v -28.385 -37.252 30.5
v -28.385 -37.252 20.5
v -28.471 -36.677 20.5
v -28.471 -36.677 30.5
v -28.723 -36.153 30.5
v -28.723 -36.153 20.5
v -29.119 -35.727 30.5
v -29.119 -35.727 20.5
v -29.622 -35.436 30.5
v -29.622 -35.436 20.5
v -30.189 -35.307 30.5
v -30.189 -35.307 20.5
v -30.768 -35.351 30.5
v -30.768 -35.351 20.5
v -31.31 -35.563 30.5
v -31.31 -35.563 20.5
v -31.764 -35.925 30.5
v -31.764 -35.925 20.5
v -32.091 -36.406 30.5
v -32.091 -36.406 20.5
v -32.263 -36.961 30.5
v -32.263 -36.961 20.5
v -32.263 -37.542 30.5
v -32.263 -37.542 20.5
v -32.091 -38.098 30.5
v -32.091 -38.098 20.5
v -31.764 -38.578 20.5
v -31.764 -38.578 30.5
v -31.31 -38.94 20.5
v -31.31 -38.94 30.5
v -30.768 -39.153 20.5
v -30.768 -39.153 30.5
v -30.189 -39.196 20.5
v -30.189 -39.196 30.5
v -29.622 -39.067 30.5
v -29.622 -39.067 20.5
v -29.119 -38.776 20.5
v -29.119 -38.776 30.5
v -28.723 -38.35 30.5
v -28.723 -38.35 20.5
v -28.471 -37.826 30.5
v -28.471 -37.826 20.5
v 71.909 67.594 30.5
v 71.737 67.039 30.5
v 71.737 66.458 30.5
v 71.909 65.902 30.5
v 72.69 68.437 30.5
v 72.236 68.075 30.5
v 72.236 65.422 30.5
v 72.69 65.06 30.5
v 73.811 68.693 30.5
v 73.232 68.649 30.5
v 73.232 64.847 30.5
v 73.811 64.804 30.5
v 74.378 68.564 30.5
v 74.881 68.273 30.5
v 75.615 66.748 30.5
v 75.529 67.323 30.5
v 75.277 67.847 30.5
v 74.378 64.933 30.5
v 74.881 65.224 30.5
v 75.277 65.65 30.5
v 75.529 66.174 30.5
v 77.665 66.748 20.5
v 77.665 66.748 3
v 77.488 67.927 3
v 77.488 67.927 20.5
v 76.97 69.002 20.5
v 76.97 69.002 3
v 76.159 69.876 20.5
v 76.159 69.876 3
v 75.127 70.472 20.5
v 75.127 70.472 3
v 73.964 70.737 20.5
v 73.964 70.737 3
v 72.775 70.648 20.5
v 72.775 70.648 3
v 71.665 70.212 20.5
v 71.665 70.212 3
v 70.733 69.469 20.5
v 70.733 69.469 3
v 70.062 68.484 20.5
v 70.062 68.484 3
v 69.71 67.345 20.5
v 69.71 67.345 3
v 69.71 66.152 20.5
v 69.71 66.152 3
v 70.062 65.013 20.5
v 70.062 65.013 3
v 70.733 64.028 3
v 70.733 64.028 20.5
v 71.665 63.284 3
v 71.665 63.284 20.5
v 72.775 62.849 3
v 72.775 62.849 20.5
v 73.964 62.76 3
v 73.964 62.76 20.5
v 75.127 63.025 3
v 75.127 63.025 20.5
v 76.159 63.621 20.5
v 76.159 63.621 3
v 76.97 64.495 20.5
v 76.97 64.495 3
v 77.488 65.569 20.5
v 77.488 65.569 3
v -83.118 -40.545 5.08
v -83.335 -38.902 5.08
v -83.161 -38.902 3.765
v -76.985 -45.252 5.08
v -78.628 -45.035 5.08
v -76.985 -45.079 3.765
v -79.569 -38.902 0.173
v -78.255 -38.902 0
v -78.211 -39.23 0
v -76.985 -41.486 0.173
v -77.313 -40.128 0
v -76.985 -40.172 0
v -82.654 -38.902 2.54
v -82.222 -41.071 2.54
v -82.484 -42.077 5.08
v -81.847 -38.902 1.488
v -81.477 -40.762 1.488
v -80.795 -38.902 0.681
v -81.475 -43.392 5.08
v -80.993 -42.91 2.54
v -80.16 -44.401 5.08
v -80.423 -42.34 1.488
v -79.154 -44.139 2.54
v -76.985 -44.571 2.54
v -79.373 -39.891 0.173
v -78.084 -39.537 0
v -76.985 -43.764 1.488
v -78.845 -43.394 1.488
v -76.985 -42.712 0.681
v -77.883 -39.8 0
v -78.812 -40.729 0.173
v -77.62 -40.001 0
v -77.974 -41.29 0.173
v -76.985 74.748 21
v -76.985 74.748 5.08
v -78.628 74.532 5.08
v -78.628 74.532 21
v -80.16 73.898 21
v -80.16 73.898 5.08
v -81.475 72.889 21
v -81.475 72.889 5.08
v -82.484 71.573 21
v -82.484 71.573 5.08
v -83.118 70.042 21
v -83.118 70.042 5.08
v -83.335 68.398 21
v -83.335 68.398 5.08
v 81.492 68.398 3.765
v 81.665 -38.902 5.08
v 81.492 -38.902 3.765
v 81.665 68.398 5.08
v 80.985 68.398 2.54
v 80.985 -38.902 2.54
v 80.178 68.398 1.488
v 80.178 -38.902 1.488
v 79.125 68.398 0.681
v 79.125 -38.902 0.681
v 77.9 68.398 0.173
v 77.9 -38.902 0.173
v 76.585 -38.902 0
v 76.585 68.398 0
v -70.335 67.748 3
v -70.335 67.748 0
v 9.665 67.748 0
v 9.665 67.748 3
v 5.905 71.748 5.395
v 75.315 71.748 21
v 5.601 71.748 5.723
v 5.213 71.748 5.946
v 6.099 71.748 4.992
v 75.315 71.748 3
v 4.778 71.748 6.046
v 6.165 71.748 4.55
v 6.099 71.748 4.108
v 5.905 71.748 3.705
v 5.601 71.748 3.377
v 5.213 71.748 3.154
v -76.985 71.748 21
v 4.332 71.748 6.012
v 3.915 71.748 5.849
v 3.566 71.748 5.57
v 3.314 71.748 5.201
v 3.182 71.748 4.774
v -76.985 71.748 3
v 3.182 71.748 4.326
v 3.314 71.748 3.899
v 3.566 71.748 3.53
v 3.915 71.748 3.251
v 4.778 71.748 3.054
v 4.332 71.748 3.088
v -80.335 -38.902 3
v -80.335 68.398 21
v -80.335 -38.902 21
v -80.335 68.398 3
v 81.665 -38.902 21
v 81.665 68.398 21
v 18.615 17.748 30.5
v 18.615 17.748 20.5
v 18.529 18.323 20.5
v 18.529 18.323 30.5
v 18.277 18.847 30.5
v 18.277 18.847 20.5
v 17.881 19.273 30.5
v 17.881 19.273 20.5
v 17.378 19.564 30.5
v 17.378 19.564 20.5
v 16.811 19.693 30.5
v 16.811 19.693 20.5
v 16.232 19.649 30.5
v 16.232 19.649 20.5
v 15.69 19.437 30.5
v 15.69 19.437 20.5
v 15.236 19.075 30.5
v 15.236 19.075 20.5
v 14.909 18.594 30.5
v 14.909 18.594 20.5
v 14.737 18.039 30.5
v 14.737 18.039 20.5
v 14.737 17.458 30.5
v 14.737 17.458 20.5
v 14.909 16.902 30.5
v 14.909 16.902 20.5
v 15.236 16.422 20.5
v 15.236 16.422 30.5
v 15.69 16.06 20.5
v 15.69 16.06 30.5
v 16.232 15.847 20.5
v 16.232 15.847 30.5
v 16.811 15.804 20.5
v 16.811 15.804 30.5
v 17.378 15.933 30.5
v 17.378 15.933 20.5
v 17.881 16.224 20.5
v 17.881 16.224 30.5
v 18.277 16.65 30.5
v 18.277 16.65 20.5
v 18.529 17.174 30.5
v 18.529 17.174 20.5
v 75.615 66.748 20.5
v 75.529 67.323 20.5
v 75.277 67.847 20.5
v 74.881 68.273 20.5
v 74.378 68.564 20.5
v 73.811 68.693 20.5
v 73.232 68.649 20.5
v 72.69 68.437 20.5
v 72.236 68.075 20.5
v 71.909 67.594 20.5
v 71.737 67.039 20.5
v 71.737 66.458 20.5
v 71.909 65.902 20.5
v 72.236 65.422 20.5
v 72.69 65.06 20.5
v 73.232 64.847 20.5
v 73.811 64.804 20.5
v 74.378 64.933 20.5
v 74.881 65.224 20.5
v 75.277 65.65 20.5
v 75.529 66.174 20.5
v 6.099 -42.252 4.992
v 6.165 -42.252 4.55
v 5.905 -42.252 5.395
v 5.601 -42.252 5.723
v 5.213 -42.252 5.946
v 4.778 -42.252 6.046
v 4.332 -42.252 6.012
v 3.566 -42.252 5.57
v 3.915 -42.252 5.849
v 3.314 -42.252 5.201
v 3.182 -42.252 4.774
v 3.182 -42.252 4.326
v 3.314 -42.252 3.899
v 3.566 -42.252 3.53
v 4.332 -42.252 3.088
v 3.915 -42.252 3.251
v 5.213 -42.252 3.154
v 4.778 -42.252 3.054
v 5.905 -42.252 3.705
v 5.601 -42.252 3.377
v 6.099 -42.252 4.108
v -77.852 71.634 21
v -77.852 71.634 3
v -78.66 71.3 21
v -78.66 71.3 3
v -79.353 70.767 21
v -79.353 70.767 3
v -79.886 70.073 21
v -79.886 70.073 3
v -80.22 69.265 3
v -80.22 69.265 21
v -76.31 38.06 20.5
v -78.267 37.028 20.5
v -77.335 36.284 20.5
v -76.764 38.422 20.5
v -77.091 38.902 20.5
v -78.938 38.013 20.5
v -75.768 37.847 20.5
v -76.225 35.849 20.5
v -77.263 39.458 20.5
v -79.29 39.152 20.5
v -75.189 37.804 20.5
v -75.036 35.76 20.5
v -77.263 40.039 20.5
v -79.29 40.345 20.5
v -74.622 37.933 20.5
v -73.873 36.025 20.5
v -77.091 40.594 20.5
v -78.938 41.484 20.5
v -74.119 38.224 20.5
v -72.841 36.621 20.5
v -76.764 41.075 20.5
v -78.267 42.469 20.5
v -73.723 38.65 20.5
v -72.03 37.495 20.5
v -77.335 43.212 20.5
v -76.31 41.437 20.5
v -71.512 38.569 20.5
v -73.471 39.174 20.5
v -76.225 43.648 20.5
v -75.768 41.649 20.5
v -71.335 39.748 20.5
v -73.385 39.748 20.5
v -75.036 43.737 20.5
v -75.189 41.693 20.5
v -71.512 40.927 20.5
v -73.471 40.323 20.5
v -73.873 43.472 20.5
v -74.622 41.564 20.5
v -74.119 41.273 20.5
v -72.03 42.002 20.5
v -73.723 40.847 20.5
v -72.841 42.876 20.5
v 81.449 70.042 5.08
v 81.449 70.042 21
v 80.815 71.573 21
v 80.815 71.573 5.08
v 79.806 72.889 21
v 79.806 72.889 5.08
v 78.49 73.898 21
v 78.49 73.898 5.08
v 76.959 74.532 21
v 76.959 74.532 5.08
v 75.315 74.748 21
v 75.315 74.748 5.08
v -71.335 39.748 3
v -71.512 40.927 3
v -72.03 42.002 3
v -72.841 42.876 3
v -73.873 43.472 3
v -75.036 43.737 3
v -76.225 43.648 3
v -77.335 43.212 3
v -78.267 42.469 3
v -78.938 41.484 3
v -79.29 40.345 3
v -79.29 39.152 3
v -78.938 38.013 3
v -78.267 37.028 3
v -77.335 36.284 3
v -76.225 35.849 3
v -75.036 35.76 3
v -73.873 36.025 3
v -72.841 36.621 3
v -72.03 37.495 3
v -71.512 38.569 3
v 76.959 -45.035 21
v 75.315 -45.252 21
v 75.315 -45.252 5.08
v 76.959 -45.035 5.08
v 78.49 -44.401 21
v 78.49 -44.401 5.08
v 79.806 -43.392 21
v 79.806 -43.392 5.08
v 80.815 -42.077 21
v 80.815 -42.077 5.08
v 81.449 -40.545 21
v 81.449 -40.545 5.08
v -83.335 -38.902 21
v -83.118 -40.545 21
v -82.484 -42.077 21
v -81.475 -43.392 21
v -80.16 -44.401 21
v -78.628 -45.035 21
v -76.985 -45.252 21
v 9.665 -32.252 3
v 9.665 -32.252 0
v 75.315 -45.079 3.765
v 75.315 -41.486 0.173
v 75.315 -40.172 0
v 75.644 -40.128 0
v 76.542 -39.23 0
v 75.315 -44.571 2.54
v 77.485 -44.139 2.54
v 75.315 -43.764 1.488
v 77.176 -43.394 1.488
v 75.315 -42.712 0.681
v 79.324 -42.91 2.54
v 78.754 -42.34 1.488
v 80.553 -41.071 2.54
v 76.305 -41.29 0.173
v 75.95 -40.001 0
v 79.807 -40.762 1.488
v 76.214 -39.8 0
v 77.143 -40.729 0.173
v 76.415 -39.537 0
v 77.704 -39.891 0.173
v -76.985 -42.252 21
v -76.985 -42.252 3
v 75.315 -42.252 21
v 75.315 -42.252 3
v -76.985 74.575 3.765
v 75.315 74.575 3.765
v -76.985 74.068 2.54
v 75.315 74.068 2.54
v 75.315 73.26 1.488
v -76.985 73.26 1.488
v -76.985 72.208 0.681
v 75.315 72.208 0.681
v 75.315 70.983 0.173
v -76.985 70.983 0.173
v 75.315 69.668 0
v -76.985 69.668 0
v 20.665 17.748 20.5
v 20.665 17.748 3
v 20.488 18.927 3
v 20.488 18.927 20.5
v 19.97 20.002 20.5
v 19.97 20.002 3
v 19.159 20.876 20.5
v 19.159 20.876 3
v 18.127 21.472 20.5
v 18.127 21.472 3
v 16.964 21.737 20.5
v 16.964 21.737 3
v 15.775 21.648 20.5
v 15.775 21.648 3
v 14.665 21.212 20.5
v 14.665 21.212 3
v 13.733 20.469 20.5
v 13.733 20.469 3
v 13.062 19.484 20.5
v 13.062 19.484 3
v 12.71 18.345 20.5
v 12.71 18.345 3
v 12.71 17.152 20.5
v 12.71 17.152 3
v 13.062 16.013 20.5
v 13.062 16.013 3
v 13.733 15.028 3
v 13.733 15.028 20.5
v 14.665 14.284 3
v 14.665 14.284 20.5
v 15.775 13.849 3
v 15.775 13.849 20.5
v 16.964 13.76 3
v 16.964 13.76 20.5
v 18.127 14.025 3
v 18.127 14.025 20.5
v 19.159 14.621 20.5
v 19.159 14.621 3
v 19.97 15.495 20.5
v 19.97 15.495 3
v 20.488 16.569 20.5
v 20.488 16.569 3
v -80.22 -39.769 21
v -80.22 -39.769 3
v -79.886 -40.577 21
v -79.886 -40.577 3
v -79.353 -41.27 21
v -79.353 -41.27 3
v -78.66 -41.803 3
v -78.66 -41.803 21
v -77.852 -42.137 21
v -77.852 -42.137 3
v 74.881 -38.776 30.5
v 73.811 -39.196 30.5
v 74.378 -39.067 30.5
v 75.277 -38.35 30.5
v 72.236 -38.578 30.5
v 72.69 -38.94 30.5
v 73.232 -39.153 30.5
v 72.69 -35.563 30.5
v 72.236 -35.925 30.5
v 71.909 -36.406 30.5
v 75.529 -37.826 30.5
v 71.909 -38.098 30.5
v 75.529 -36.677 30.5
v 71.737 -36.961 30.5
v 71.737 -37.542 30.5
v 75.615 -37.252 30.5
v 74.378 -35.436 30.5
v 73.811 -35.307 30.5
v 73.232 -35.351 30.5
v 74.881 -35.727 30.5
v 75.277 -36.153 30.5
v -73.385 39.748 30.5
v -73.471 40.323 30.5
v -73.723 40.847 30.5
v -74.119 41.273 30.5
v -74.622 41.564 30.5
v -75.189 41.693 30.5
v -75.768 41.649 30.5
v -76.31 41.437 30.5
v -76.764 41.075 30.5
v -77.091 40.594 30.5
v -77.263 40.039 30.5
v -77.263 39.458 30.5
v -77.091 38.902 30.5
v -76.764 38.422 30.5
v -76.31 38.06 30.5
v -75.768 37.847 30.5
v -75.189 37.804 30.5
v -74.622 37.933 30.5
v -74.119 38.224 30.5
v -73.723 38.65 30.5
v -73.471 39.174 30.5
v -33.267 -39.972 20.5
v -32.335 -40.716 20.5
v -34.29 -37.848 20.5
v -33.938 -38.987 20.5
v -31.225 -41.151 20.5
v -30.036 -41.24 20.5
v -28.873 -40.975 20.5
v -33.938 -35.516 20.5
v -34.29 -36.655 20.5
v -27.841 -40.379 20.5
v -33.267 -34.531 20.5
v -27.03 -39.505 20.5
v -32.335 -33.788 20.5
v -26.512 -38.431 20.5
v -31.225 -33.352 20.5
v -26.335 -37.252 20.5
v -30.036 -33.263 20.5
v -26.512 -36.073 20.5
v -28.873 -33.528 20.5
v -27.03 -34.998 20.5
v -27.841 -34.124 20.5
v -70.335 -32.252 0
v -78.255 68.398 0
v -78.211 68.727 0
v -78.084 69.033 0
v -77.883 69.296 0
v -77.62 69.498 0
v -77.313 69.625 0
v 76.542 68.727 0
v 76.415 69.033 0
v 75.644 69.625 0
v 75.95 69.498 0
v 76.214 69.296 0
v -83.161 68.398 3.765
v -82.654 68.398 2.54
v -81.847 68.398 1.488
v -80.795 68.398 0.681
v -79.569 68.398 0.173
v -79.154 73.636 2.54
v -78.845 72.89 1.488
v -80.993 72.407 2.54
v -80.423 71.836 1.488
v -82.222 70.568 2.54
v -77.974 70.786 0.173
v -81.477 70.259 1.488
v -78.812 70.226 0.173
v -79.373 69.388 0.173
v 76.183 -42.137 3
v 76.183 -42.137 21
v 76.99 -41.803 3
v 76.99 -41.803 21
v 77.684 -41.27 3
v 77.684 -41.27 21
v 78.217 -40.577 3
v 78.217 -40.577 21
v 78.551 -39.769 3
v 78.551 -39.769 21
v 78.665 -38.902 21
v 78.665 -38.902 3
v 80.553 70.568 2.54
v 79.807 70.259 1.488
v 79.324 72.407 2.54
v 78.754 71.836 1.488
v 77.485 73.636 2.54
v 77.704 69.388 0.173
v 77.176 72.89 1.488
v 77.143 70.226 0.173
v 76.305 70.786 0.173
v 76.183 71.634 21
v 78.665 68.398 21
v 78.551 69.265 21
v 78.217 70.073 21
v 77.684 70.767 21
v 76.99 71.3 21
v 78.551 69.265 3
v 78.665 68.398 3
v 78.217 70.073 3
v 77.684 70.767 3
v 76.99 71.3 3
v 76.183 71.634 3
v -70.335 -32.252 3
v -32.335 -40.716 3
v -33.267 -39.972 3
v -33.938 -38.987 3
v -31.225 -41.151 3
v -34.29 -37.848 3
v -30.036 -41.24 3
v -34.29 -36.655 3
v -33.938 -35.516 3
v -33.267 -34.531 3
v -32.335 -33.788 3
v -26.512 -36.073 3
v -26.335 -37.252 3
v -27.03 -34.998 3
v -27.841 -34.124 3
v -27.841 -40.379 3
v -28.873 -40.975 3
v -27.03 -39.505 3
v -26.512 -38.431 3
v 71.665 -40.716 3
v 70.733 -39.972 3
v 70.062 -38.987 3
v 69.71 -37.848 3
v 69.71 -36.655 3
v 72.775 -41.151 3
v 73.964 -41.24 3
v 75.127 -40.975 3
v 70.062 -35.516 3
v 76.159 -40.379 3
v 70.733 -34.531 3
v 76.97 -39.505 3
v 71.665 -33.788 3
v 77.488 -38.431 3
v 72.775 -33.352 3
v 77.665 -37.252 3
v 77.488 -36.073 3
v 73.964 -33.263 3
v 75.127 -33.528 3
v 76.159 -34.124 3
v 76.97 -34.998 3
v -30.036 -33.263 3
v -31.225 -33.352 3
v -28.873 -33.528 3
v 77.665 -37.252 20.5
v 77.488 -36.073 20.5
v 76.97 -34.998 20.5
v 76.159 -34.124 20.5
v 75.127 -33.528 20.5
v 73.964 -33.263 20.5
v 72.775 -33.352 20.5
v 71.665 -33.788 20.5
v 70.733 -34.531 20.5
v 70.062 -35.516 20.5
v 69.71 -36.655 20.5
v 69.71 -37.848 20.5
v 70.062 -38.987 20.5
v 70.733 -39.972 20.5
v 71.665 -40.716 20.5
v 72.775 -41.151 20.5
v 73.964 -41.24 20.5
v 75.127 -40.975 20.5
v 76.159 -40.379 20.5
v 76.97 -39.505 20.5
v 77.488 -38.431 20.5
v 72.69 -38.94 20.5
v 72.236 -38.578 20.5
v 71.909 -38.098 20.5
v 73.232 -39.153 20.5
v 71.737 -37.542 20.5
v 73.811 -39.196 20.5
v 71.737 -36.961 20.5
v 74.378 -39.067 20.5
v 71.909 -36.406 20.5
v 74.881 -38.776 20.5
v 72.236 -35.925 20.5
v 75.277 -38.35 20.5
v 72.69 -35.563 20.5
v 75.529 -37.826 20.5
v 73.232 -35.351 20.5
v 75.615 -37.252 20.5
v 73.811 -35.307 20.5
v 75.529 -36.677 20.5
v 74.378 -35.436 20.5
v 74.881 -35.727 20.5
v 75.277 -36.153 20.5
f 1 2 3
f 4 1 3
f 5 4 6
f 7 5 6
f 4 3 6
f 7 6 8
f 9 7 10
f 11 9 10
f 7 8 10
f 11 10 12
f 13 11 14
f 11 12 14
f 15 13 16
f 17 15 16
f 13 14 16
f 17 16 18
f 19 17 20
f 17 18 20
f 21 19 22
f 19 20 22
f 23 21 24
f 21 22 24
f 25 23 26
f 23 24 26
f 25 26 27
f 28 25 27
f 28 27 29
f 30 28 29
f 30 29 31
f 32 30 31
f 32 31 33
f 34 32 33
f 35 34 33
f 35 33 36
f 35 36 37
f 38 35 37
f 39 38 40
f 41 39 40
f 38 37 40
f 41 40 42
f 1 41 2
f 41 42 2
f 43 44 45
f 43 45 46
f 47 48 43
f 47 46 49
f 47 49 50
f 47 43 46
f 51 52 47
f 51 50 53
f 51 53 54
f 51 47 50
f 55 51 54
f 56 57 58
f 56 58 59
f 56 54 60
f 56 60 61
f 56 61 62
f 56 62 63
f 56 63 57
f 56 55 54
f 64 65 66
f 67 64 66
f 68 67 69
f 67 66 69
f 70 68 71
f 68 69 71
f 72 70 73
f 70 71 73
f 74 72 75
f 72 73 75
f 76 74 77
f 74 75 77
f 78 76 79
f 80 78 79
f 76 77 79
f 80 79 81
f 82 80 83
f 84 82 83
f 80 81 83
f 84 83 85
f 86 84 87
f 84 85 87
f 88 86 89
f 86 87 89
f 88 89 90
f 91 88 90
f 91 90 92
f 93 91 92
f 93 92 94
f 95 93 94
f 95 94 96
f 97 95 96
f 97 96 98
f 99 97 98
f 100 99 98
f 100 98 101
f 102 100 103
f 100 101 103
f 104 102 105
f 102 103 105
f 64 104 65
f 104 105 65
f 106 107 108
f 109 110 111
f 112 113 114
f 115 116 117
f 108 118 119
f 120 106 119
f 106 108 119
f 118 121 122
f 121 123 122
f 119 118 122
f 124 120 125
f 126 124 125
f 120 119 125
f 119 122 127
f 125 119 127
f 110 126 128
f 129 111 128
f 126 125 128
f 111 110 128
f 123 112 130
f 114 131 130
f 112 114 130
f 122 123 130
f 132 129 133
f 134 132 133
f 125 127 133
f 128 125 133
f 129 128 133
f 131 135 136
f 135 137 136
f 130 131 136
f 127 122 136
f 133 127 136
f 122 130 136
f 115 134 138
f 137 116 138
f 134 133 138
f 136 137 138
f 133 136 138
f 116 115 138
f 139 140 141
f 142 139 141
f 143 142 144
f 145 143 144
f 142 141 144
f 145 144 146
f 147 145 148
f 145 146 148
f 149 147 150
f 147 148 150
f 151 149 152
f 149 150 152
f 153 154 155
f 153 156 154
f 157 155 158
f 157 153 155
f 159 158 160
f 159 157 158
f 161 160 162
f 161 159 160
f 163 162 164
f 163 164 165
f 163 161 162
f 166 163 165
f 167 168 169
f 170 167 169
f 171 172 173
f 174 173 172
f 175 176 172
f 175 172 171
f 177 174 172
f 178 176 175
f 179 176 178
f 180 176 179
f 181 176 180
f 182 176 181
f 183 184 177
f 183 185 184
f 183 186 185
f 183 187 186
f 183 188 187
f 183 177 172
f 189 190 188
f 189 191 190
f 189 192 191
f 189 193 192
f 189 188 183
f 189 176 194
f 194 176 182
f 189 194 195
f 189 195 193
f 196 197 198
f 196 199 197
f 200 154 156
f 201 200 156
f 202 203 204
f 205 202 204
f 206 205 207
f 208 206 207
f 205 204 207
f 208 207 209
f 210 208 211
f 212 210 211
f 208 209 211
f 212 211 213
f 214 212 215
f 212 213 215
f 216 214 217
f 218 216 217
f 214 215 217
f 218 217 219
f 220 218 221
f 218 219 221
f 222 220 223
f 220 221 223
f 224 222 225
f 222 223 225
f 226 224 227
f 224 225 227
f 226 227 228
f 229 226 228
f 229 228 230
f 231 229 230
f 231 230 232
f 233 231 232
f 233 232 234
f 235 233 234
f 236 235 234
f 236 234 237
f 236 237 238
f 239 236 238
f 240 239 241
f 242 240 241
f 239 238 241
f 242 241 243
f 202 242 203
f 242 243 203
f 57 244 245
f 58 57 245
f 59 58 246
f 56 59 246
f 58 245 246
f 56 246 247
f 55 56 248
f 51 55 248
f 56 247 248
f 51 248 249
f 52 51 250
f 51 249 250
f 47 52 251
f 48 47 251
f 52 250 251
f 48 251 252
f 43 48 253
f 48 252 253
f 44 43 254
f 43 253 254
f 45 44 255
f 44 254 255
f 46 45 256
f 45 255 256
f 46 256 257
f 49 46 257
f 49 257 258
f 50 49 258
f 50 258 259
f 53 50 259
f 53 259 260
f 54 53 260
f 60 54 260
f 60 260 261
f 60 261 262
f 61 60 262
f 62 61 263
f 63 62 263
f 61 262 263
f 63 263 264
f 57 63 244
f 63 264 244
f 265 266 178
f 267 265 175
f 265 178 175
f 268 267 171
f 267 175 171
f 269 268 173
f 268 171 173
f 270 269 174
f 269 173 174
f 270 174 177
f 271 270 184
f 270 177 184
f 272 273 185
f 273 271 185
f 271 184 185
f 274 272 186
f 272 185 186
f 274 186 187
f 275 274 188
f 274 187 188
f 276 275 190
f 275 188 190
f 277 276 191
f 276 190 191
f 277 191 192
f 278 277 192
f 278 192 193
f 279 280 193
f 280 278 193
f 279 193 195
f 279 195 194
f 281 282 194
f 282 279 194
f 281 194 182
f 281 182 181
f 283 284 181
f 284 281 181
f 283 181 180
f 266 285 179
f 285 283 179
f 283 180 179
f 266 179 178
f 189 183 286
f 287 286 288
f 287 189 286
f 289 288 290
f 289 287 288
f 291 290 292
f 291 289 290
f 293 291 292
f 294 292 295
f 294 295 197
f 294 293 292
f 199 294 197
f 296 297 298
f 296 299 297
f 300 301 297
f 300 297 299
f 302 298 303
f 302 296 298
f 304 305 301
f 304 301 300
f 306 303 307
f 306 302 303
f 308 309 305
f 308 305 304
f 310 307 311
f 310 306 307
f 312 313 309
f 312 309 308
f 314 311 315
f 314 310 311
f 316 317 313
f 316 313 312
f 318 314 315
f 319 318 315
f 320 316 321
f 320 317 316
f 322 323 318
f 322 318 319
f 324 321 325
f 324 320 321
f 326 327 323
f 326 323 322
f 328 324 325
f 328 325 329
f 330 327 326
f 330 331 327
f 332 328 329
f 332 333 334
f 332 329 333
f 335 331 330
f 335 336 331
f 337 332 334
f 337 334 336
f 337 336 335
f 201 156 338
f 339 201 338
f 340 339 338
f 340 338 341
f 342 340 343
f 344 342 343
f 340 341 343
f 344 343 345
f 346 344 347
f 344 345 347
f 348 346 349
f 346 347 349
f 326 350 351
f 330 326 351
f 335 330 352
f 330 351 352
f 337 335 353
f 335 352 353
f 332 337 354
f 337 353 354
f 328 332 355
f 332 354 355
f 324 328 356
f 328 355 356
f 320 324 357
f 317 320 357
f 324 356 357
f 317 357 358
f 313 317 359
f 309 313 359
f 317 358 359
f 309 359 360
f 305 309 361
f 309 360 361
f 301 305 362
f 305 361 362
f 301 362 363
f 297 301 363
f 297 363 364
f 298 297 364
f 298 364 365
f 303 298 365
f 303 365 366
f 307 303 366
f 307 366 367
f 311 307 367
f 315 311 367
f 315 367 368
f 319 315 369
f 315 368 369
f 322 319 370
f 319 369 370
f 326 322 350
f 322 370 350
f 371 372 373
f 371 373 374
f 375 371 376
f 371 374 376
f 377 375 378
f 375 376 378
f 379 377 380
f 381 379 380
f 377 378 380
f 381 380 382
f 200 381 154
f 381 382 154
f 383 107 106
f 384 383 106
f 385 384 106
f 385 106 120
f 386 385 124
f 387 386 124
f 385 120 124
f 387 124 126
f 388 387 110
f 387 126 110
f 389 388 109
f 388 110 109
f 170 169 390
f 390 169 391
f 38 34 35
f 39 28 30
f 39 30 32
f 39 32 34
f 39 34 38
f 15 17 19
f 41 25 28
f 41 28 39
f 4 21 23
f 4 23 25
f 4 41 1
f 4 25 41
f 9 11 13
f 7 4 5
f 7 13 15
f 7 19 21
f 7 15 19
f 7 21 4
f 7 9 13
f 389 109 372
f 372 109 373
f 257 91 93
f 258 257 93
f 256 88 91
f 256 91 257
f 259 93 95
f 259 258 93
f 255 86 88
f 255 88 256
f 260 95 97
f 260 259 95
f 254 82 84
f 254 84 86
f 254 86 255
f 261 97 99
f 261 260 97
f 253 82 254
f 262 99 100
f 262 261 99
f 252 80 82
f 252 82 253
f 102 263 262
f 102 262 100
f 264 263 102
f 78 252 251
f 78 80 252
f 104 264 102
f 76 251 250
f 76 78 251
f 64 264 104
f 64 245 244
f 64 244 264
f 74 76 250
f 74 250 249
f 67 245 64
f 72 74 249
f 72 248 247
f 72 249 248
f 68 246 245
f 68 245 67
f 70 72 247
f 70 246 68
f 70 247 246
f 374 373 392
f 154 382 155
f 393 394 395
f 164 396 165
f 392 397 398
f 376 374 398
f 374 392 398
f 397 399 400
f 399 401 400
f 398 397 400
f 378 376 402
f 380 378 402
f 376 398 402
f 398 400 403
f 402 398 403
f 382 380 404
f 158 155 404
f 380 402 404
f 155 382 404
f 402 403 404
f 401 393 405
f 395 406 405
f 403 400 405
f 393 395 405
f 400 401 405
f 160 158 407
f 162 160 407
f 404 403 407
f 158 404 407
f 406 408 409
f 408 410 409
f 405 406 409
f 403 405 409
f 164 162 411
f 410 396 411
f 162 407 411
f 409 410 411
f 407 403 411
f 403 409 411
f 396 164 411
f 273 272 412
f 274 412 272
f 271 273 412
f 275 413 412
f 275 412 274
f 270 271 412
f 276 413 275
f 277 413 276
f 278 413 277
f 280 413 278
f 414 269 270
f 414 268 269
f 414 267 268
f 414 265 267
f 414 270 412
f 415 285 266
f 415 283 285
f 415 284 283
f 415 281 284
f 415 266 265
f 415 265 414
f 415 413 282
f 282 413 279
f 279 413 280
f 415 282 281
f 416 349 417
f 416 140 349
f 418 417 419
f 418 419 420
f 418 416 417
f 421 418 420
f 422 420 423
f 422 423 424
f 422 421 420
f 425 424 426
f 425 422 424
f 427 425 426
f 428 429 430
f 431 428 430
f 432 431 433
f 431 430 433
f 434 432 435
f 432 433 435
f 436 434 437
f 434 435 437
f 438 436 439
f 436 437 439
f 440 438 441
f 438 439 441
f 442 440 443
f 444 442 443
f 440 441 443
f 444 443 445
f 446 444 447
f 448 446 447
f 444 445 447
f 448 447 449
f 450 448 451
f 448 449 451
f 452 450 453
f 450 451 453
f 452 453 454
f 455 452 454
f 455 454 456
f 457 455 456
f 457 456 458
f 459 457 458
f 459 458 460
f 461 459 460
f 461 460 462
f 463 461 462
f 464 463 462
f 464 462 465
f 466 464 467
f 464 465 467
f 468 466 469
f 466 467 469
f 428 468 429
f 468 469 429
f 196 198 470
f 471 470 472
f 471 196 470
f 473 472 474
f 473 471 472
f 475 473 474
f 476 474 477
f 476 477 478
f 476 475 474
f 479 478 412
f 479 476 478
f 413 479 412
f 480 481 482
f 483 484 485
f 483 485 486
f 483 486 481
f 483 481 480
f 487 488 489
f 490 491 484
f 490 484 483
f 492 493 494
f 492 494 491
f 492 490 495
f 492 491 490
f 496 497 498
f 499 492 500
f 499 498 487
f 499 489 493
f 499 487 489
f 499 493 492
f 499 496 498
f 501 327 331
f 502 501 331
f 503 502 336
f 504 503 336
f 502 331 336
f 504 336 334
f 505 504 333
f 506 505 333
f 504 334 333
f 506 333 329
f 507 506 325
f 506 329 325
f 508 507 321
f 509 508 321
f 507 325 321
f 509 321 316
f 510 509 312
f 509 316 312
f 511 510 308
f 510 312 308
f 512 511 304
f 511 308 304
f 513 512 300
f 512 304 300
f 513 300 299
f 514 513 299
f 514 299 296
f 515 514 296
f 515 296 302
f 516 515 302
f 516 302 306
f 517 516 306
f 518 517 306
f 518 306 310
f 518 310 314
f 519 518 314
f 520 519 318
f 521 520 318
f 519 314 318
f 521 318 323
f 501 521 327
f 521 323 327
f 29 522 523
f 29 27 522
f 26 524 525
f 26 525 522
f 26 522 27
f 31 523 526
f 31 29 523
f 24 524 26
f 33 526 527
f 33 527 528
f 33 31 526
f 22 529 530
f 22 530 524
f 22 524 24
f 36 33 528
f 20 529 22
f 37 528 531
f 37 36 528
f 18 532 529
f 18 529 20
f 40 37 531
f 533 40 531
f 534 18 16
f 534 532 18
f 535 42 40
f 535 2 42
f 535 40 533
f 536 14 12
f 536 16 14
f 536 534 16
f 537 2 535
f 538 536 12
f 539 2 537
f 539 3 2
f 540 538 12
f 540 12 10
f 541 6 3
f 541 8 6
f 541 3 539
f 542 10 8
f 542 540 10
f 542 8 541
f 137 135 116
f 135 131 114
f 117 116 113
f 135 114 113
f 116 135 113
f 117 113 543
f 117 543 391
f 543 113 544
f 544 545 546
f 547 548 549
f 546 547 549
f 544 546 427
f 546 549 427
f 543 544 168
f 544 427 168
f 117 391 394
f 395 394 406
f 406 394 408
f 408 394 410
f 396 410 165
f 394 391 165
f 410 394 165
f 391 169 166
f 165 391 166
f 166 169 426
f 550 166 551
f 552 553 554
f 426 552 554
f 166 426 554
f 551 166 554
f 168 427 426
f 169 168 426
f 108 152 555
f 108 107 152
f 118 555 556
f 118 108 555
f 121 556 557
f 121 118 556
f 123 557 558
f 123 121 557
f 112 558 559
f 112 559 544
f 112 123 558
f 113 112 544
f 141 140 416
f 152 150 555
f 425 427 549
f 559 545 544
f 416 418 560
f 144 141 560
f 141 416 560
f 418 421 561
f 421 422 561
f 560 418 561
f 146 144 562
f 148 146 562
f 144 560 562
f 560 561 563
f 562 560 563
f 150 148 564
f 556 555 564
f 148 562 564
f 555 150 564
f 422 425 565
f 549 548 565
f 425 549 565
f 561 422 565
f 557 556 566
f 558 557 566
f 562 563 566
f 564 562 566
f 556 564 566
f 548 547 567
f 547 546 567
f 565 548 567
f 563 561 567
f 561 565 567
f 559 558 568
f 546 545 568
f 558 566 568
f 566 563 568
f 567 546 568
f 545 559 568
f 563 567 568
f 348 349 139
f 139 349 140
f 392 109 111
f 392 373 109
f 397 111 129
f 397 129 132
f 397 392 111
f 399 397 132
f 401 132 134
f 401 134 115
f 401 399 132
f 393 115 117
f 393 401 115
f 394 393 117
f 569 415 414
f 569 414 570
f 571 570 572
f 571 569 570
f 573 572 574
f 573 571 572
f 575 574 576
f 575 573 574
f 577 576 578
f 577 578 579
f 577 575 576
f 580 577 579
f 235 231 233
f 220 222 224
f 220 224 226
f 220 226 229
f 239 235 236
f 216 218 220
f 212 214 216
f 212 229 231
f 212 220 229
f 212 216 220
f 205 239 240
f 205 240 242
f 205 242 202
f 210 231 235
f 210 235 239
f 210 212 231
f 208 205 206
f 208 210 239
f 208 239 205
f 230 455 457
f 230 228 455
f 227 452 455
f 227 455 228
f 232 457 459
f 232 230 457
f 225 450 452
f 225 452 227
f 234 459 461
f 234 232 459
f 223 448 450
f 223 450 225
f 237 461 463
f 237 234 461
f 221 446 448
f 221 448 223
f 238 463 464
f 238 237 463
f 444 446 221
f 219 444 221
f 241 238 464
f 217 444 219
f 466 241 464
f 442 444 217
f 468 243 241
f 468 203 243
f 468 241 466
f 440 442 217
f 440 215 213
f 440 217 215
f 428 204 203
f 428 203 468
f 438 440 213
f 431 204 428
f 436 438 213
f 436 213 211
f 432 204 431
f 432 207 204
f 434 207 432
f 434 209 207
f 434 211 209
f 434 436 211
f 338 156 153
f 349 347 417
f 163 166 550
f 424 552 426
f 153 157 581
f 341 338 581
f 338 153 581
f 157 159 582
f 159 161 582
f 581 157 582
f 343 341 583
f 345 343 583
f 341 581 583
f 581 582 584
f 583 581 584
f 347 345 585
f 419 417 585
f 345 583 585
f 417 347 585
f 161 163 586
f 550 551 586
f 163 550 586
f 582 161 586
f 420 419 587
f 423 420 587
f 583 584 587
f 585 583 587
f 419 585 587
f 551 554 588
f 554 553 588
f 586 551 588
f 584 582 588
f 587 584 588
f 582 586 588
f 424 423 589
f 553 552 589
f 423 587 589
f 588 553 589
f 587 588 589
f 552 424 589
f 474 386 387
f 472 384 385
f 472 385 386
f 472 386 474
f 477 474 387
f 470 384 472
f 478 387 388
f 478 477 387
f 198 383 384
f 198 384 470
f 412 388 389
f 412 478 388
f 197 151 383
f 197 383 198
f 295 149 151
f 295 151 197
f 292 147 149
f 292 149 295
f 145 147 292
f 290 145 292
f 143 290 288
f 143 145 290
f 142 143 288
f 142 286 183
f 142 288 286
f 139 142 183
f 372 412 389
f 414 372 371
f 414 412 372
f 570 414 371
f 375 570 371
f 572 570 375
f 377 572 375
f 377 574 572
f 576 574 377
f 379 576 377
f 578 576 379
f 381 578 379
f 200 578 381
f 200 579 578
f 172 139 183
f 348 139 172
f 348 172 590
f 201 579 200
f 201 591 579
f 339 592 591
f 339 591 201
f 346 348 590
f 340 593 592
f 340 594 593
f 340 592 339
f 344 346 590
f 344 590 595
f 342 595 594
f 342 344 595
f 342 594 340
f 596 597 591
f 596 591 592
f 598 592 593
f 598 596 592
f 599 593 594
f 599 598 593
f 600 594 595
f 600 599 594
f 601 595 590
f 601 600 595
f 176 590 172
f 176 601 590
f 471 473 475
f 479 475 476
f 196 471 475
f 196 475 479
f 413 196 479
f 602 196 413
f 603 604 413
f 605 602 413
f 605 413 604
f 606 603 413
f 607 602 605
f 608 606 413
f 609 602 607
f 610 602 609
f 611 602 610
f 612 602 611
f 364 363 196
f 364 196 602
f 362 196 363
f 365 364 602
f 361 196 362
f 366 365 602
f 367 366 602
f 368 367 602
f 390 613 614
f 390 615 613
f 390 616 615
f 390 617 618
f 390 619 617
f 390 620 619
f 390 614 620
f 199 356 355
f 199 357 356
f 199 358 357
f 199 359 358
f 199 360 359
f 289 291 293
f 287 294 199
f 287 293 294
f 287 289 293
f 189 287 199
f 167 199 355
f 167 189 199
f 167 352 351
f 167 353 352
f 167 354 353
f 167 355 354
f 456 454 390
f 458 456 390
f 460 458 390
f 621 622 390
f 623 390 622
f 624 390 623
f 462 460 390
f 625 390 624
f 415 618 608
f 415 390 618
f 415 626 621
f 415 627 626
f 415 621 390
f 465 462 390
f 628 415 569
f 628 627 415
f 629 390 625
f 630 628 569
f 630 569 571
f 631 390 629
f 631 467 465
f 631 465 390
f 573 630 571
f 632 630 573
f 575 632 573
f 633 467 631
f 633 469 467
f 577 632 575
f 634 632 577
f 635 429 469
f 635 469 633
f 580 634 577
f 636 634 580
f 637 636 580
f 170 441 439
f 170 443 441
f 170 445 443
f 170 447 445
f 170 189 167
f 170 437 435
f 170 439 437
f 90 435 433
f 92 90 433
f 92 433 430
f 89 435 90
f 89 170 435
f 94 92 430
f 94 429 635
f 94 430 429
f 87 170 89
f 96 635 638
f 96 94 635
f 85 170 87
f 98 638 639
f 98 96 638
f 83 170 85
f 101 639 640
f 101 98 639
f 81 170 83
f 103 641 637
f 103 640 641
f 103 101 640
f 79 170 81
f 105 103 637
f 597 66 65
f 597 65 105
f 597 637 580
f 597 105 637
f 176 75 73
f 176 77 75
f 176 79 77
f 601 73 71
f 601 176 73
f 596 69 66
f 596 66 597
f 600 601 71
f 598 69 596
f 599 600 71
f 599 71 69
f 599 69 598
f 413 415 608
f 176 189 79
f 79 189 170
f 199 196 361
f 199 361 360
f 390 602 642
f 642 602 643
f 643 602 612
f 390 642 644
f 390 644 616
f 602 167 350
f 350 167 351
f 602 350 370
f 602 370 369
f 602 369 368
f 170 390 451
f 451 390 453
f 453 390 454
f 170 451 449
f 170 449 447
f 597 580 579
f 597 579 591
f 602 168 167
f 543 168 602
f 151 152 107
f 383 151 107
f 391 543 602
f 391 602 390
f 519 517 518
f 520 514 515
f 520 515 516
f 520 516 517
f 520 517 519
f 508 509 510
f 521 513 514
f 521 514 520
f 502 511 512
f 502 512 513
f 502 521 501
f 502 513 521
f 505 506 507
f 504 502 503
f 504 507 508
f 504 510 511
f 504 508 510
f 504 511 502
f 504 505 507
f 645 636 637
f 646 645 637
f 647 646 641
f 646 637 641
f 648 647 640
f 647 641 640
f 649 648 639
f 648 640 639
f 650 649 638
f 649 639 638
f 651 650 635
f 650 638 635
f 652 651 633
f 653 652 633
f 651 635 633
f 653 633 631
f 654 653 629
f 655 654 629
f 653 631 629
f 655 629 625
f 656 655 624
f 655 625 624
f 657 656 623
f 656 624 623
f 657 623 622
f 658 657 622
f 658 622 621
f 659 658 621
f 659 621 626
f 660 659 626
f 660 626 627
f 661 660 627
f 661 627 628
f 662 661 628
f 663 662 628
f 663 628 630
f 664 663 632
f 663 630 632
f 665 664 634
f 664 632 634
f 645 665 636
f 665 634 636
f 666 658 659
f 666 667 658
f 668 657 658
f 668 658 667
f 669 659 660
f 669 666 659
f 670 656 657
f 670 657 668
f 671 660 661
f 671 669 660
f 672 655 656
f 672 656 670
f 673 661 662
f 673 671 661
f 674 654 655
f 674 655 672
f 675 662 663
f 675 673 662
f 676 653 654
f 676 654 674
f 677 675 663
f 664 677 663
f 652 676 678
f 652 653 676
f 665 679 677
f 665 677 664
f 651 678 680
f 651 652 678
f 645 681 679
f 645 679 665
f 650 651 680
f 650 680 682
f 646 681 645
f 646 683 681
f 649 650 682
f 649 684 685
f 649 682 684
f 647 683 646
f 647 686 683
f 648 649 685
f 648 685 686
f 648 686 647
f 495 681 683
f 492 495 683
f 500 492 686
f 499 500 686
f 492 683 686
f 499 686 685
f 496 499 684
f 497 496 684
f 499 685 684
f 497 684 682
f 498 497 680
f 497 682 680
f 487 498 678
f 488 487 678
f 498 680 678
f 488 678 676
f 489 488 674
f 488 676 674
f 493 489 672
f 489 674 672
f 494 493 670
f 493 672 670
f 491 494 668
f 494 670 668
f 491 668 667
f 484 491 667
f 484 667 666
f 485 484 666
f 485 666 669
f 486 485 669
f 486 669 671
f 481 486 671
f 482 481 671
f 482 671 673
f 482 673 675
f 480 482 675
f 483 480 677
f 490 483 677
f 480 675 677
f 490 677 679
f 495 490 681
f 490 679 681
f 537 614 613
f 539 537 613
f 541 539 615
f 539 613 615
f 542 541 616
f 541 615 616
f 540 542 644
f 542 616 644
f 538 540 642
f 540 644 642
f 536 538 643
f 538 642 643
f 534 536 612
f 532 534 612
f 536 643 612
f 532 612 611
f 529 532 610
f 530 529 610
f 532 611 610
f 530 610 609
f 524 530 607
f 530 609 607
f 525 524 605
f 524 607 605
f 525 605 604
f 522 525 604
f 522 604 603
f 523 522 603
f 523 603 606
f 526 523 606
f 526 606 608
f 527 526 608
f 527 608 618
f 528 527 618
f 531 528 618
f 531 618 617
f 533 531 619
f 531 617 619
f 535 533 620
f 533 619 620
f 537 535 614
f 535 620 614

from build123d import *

# Parameters (mm, degrees)
F1_DEPTH  = 21
F2_T      = -3
F3_R      = 5.08
F4_R      = 4
F5_DEPTH  = 17.5
F6_R      = 1.95
F7_DEPTH  = 10
F8_W      = 80
F8_H      = 100
F9_DEPTH  = 25
F10_R     = 1.5
F11_DEPTH = 115


with BuildPart() as f1:
    # F0 (on Top) → F1 (new body)
    with BuildSketch(Plane.XY):
        with BuildLine():
            ThreePointArc((-83.334517, -38.901611), (-81.474645, -43.391739), (-76.984517, -45.251611))
            Line((-76.984517, -45.251611), (75.315483, -45.251611))
            ThreePointArc((75.315483, -45.251611), (79.805611, -43.391739), (81.665483, -38.901611))
            Line((81.665483, -38.901611), (81.665483, 68.398389))
            ThreePointArc((81.665483, 68.398389), (79.805611, 72.888517), (75.315483, 74.748389))
            Line((75.315483, 74.748389), (-76.984517, 74.748389))
            ThreePointArc((-76.984517, 74.748389), (-81.474645, 72.888517), (-83.334517, 68.398389))
            Line((-83.334517, 68.398389), (-83.334517, -38.901611))
        make_face()
    extrude(amount=F1_DEPTH)

    # F2
    f2_openings = [f1.faces().sort_by_distance(p)[0] for p in [
        (-0.834517, 14.748389, 21),
    ]]
    offset(amount=F2_T, openings=f2_openings)

    # F3
    f3_edges = [f1.edges().sort_by_distance(p)[0] for p in [
        (-81.474645, 72.888517, 0),
    ]]
    fillet(f3_edges, radius=F3_R)

    # F4 (on face) → F5 (join)
    with BuildSketch(Plane.XY.offset(3)):
        with Locations((73.665483, -37.251611)):
            Circle(F4_R)
        with Locations((73.665483, 66.748389)):
            Circle(F4_R)
        with Locations((16.665483, 17.748389)):
            Circle(F4_R)
        with Locations((-75.334517, 39.748389)):
            Circle(F4_R)
        with Locations((-30.334517, -37.251611)):
            Circle(F4_R)
    extrude(amount=F5_DEPTH)

    # F6 (on face) → F7 (join)
    with BuildSketch(Plane.XY.offset(20.5)):
        with Locations((73.665483, -37.251611)):
            Circle(F6_R)
        with Locations((16.665483, 17.748389)):
            Circle(F6_R)
        with Locations((73.665483, 66.748389)):
            Circle(F6_R)
        with Locations((-30.334517, -37.251611)):
            Circle(F6_R)
        with Locations((-75.334517, 39.748389)):
            Circle(F6_R)
    extrude(amount=F7_DEPTH)

    # F8 (on face) → F9 (cut)
    with BuildSketch(Plane(origin=(0, 0, 0), x_dir=(1, 0, 0), z_dir=(0, 0, -1))):
        with Locations((-30.334517, -17.748389)):
            Rectangle(F8_W, F8_H)
    extrude(amount=-F9_DEPTH, mode=Mode.SUBTRACT)

    # F10 (on face) → F11 (join)
    with BuildSketch(Plane.XZ.offset(-71.748389)):
        with Locations((4.665483, 4.55)):
            Circle(F10_R)
    extrude(amount=F11_DEPTH)


solid = f1.part
